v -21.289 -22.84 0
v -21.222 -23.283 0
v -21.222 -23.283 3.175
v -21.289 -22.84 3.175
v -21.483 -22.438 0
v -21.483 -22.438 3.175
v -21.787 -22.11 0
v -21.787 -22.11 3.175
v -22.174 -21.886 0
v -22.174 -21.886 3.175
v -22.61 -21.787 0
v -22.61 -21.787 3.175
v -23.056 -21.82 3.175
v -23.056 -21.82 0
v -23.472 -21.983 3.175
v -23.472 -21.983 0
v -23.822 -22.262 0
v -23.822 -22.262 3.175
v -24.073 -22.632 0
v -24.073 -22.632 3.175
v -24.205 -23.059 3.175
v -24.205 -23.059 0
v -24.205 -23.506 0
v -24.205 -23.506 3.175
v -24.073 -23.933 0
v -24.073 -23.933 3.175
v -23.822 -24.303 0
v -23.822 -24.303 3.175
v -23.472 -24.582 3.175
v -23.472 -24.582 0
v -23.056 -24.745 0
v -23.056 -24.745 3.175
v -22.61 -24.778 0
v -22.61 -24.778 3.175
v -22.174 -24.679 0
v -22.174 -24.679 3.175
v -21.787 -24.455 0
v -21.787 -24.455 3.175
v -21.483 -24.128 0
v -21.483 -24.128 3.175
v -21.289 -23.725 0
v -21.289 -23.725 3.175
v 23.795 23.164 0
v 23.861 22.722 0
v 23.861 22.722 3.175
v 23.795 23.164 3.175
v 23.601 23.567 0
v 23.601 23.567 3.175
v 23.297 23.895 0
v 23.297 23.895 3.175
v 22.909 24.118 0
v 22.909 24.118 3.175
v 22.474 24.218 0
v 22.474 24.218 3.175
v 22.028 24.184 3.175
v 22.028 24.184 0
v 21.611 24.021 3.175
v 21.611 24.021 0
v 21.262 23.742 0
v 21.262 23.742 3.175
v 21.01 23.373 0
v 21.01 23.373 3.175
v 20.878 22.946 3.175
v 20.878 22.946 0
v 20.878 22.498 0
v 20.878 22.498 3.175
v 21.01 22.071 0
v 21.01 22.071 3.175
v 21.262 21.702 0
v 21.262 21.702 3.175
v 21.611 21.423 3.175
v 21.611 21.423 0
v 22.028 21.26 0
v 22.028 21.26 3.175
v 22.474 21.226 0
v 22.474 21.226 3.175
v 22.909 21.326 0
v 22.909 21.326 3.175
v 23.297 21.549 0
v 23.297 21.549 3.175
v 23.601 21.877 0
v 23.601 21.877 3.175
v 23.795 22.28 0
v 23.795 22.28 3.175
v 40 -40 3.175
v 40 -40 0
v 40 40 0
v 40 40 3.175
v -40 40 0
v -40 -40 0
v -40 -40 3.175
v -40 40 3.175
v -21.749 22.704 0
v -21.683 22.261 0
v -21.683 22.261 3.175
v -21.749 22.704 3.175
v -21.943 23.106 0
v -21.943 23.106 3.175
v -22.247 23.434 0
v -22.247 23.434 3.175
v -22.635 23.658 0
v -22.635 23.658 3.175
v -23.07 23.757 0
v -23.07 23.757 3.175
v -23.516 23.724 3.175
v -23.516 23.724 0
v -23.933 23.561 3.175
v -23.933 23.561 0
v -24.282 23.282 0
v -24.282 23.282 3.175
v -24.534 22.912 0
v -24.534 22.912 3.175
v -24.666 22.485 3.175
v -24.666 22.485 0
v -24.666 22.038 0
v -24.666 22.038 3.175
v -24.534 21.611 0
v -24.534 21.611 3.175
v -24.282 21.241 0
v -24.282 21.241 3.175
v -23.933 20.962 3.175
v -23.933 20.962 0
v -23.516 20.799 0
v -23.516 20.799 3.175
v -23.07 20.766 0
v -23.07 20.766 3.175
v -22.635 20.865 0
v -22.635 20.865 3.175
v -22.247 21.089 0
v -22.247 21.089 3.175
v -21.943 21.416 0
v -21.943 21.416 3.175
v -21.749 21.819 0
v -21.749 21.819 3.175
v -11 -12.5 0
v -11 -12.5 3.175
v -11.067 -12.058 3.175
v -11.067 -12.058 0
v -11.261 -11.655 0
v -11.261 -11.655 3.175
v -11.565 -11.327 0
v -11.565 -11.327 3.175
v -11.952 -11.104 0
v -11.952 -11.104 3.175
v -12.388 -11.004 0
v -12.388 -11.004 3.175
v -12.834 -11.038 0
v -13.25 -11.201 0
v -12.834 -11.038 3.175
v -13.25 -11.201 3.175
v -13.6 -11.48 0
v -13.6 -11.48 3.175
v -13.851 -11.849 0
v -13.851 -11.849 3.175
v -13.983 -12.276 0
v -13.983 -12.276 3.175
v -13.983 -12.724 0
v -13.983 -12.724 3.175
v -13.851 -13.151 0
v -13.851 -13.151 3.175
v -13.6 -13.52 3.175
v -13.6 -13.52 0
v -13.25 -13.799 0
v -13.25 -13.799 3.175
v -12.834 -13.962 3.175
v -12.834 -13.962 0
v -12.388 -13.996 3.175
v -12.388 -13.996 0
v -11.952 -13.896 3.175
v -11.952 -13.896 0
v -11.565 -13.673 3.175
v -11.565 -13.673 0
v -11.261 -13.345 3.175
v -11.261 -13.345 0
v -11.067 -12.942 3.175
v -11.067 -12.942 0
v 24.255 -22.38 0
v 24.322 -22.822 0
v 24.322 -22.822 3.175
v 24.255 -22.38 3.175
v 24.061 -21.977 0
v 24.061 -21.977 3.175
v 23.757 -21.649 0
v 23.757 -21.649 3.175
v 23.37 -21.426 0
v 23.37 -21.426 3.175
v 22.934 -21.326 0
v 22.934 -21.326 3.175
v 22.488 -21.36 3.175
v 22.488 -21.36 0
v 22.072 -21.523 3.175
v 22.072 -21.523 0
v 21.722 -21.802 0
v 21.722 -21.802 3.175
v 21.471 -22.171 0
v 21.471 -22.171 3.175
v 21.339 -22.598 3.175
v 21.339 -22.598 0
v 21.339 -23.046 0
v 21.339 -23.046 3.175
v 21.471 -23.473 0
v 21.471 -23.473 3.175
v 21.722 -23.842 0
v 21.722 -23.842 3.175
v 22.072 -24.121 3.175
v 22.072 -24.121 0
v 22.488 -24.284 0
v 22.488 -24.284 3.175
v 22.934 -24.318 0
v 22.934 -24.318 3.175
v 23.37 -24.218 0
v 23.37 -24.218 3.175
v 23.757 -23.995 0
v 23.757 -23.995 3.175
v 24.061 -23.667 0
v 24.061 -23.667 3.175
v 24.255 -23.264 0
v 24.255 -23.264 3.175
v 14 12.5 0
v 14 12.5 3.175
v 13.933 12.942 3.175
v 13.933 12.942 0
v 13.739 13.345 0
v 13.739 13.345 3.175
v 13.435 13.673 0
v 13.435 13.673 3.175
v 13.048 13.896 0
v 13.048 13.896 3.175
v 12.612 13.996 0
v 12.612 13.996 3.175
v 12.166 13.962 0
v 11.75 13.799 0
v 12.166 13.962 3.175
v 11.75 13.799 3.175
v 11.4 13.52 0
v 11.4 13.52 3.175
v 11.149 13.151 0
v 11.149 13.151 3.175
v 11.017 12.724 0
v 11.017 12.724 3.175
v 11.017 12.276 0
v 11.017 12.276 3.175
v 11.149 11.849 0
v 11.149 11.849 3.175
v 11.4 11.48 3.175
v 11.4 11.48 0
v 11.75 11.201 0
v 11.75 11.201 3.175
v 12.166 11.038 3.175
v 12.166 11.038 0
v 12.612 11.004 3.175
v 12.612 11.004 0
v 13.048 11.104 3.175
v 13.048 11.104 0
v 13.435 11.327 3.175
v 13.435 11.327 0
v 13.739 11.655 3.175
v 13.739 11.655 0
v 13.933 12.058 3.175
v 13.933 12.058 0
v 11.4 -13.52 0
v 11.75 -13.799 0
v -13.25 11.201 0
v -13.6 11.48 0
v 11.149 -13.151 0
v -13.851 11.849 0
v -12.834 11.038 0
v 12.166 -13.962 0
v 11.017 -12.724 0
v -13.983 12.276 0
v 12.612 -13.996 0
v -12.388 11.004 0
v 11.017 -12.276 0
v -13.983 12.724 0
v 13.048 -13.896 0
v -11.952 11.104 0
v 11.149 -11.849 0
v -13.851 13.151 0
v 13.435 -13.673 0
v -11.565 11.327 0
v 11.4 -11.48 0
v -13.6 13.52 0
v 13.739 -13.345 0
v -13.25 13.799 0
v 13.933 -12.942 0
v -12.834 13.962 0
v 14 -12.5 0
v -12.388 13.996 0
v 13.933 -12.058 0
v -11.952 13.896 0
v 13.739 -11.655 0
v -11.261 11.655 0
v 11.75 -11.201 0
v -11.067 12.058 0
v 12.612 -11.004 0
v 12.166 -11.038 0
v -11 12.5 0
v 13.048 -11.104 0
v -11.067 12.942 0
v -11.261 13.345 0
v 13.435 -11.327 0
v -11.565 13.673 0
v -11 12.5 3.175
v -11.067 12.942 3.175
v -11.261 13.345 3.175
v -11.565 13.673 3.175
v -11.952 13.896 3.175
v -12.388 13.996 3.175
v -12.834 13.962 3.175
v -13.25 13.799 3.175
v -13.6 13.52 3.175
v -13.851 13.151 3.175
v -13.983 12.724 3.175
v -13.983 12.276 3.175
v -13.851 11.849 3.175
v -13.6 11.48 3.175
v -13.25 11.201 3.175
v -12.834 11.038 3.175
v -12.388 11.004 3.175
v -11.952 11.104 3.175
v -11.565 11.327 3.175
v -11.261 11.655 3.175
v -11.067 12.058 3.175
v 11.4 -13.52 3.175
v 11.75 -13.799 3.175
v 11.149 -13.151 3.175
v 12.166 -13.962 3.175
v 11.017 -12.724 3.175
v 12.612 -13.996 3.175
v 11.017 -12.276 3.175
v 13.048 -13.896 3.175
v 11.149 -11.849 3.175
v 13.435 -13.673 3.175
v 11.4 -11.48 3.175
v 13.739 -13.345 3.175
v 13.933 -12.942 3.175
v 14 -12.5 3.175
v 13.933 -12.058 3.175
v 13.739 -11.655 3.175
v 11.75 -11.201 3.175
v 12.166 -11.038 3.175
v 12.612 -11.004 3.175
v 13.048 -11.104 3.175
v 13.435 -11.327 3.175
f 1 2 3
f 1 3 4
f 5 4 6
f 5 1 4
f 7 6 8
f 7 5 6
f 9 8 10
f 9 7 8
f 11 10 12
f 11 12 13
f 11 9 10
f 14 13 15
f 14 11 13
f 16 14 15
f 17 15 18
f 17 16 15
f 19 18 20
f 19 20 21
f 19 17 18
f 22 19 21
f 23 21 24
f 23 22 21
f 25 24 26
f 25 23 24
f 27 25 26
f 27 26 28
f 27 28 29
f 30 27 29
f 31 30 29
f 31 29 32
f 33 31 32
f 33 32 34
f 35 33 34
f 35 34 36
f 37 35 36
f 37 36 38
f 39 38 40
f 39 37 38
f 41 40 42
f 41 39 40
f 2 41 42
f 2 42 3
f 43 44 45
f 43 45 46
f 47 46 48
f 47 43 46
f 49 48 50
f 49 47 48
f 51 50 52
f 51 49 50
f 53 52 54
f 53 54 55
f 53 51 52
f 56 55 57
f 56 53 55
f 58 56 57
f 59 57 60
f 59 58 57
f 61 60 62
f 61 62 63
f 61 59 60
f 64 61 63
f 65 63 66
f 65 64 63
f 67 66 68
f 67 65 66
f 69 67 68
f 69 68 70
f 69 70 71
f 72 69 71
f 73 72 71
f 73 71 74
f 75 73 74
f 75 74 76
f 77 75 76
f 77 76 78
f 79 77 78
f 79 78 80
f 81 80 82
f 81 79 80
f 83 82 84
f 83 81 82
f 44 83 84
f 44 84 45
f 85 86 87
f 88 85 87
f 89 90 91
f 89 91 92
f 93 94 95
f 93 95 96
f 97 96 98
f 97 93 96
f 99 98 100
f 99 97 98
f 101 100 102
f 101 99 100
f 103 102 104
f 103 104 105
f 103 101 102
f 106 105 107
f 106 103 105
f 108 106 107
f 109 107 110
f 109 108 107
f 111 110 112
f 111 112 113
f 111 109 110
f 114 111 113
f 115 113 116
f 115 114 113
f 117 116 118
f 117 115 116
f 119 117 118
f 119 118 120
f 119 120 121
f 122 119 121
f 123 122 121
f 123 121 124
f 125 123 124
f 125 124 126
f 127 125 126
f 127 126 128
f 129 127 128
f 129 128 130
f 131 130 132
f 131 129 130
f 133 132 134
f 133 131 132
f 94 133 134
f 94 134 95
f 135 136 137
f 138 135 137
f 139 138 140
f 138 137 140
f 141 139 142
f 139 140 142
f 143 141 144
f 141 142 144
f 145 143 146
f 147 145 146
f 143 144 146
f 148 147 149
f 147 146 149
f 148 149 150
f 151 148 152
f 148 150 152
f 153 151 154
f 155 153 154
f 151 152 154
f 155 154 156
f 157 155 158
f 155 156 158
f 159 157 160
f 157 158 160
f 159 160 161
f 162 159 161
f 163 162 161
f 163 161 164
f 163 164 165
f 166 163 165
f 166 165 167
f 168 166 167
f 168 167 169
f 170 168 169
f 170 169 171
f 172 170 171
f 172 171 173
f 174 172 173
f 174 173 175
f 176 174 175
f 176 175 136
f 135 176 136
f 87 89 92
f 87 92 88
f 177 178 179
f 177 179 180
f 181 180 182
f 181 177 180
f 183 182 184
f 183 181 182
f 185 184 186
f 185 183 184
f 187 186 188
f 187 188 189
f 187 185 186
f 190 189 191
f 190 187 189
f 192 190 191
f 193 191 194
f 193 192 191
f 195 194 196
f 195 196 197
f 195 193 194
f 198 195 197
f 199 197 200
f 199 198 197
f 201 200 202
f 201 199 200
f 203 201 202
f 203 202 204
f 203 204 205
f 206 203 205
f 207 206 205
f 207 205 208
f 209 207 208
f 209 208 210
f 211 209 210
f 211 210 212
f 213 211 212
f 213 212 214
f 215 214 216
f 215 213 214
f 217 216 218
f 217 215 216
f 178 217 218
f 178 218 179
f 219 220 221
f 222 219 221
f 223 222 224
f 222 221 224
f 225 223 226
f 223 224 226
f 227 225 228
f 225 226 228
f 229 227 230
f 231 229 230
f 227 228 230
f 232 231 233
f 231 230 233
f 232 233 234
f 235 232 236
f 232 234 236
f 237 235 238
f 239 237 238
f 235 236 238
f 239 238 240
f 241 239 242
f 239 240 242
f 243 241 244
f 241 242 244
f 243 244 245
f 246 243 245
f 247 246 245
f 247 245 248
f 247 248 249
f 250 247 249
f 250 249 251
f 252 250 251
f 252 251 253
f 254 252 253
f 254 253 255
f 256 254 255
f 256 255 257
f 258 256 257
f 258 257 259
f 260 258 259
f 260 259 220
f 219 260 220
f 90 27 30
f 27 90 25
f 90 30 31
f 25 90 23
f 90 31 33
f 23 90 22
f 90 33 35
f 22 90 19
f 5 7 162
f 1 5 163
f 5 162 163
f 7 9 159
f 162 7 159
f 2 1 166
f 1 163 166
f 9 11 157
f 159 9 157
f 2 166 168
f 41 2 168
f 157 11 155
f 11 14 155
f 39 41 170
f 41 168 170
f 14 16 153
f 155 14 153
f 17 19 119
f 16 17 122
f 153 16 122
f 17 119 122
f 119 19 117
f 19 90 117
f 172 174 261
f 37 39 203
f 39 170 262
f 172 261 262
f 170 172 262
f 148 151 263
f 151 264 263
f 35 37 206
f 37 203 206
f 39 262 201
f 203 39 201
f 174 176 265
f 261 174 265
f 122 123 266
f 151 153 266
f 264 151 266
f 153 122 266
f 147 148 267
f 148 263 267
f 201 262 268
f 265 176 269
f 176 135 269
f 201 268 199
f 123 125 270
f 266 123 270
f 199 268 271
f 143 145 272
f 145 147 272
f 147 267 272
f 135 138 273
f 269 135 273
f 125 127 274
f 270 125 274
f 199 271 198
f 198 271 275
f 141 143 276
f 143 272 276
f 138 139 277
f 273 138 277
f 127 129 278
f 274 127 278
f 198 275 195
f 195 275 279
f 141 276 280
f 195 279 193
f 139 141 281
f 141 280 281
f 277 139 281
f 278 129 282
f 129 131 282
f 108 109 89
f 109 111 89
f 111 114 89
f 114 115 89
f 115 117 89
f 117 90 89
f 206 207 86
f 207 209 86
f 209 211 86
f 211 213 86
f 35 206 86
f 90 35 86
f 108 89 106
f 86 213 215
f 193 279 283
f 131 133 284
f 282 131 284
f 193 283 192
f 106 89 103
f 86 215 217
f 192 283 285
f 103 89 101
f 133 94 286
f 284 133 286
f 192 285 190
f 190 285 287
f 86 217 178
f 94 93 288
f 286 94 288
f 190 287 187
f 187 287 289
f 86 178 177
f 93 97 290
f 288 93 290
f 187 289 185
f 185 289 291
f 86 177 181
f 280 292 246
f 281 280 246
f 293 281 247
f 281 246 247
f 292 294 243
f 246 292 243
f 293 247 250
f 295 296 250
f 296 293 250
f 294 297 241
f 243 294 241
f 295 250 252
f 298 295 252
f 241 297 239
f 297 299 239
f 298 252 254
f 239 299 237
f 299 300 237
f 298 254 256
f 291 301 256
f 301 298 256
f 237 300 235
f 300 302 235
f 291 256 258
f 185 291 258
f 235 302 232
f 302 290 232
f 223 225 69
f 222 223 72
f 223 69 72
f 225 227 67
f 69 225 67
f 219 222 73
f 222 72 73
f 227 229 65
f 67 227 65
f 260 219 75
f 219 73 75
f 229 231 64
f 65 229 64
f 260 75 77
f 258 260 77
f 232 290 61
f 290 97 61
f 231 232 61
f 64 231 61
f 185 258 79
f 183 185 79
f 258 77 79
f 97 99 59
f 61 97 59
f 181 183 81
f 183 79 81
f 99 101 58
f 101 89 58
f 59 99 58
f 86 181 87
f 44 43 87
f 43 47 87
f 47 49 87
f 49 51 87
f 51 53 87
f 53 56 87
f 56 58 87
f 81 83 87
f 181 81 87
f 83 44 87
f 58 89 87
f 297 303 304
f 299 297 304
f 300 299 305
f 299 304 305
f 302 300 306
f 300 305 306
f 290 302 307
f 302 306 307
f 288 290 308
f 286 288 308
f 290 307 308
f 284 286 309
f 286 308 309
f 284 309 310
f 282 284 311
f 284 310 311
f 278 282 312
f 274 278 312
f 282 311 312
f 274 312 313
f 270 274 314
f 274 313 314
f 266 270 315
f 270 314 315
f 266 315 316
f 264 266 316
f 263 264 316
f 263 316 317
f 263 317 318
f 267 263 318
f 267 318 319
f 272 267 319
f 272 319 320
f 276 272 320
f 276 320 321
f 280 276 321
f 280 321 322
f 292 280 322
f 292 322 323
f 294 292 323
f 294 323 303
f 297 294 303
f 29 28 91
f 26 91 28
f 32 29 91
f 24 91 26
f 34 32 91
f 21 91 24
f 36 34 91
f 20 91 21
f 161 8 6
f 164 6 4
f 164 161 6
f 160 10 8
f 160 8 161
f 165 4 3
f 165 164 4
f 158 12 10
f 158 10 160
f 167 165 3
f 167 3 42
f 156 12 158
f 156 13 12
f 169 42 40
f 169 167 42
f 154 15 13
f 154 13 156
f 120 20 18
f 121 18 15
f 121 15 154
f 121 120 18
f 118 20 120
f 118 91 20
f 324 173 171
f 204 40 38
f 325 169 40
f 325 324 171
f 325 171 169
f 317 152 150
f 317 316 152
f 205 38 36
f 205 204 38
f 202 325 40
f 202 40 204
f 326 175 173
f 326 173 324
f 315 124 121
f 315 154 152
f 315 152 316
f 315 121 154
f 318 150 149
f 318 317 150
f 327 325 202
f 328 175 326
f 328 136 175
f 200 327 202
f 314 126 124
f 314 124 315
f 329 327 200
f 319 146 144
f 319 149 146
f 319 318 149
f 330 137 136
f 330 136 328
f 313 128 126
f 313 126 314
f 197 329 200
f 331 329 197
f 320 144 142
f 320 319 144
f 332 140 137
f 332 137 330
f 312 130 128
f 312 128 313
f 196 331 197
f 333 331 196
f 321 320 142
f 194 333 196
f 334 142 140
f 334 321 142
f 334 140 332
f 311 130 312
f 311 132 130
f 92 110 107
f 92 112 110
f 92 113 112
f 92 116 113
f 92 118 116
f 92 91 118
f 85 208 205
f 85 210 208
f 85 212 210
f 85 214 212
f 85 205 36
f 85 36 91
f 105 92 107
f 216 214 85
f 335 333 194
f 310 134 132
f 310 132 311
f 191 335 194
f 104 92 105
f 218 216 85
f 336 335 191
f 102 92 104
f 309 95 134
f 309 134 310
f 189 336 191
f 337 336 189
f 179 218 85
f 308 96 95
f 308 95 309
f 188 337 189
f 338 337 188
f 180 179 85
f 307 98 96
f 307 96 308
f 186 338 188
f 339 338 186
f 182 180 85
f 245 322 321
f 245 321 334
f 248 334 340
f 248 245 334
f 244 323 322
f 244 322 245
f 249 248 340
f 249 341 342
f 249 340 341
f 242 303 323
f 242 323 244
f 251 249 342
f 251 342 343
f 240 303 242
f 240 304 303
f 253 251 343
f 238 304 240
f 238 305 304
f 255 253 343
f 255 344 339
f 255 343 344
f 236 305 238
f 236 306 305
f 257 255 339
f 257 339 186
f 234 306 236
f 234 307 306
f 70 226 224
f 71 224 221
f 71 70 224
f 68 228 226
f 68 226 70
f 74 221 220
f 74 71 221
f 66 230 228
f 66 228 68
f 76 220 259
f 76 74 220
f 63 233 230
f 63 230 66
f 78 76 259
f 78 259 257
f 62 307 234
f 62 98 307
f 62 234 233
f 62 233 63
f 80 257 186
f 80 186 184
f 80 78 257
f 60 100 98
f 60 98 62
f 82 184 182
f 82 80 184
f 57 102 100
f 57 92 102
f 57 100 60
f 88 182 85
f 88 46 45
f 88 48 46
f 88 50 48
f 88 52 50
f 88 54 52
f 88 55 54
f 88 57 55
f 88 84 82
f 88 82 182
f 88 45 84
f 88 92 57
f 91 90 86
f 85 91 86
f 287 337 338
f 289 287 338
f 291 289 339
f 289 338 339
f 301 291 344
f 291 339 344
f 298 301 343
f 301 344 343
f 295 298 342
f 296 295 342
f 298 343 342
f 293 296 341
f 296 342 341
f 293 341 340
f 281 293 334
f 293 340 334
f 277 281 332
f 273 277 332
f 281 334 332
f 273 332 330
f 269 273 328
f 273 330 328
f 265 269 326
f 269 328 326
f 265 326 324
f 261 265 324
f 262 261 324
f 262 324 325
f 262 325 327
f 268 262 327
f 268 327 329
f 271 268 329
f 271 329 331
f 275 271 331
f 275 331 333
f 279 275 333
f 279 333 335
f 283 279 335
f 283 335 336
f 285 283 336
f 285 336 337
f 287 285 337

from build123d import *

# Parameters (mm, degrees)
F0_W     = 80
F0_H     = 80
F0_R     = 1.5
F1_DEPTH = 3.175
F2_R     = 1.5
F3_DEPTH = 25


with BuildPart() as f1:
    # F0 (on Top) → F1 (new body)
    with BuildSketch(Plane.XY):
        Rectangle(F0_W, F0_H)
        with Locations((-22.722, -23.282524)):
            Circle(F0_R, mode=Mode.SUBTRACT)
        with Locations((22.822, -22.822)):
            Circle(F0_R, mode=Mode.SUBTRACT)
        with Locations((-23.182524, 22.261476)):
            Circle(F0_R, mode=Mode.SUBTRACT)
        with Locations((22.361476, 22.722)):
            Circle(F0_R, mode=Mode.SUBTRACT)
    extrude(amount=F1_DEPTH)

    # F2 (on face) → F3 (cut)
    with BuildSketch(Plane.XY.offset(3.175)):
        with Locations((-12.5, 12.5)):
            Circle(F2_R)
        with Locations((12.5, 12.5)):
            Circle(F2_R)
        with Locations((12.5, -12.5)):
            Circle(F2_R)
        with Locations((-12.5, -12.5)):
            Circle(F2_R)
    extrude(amount=-F3_DEPTH, mode=Mode.SUBTRACT)


solid = f1.part
